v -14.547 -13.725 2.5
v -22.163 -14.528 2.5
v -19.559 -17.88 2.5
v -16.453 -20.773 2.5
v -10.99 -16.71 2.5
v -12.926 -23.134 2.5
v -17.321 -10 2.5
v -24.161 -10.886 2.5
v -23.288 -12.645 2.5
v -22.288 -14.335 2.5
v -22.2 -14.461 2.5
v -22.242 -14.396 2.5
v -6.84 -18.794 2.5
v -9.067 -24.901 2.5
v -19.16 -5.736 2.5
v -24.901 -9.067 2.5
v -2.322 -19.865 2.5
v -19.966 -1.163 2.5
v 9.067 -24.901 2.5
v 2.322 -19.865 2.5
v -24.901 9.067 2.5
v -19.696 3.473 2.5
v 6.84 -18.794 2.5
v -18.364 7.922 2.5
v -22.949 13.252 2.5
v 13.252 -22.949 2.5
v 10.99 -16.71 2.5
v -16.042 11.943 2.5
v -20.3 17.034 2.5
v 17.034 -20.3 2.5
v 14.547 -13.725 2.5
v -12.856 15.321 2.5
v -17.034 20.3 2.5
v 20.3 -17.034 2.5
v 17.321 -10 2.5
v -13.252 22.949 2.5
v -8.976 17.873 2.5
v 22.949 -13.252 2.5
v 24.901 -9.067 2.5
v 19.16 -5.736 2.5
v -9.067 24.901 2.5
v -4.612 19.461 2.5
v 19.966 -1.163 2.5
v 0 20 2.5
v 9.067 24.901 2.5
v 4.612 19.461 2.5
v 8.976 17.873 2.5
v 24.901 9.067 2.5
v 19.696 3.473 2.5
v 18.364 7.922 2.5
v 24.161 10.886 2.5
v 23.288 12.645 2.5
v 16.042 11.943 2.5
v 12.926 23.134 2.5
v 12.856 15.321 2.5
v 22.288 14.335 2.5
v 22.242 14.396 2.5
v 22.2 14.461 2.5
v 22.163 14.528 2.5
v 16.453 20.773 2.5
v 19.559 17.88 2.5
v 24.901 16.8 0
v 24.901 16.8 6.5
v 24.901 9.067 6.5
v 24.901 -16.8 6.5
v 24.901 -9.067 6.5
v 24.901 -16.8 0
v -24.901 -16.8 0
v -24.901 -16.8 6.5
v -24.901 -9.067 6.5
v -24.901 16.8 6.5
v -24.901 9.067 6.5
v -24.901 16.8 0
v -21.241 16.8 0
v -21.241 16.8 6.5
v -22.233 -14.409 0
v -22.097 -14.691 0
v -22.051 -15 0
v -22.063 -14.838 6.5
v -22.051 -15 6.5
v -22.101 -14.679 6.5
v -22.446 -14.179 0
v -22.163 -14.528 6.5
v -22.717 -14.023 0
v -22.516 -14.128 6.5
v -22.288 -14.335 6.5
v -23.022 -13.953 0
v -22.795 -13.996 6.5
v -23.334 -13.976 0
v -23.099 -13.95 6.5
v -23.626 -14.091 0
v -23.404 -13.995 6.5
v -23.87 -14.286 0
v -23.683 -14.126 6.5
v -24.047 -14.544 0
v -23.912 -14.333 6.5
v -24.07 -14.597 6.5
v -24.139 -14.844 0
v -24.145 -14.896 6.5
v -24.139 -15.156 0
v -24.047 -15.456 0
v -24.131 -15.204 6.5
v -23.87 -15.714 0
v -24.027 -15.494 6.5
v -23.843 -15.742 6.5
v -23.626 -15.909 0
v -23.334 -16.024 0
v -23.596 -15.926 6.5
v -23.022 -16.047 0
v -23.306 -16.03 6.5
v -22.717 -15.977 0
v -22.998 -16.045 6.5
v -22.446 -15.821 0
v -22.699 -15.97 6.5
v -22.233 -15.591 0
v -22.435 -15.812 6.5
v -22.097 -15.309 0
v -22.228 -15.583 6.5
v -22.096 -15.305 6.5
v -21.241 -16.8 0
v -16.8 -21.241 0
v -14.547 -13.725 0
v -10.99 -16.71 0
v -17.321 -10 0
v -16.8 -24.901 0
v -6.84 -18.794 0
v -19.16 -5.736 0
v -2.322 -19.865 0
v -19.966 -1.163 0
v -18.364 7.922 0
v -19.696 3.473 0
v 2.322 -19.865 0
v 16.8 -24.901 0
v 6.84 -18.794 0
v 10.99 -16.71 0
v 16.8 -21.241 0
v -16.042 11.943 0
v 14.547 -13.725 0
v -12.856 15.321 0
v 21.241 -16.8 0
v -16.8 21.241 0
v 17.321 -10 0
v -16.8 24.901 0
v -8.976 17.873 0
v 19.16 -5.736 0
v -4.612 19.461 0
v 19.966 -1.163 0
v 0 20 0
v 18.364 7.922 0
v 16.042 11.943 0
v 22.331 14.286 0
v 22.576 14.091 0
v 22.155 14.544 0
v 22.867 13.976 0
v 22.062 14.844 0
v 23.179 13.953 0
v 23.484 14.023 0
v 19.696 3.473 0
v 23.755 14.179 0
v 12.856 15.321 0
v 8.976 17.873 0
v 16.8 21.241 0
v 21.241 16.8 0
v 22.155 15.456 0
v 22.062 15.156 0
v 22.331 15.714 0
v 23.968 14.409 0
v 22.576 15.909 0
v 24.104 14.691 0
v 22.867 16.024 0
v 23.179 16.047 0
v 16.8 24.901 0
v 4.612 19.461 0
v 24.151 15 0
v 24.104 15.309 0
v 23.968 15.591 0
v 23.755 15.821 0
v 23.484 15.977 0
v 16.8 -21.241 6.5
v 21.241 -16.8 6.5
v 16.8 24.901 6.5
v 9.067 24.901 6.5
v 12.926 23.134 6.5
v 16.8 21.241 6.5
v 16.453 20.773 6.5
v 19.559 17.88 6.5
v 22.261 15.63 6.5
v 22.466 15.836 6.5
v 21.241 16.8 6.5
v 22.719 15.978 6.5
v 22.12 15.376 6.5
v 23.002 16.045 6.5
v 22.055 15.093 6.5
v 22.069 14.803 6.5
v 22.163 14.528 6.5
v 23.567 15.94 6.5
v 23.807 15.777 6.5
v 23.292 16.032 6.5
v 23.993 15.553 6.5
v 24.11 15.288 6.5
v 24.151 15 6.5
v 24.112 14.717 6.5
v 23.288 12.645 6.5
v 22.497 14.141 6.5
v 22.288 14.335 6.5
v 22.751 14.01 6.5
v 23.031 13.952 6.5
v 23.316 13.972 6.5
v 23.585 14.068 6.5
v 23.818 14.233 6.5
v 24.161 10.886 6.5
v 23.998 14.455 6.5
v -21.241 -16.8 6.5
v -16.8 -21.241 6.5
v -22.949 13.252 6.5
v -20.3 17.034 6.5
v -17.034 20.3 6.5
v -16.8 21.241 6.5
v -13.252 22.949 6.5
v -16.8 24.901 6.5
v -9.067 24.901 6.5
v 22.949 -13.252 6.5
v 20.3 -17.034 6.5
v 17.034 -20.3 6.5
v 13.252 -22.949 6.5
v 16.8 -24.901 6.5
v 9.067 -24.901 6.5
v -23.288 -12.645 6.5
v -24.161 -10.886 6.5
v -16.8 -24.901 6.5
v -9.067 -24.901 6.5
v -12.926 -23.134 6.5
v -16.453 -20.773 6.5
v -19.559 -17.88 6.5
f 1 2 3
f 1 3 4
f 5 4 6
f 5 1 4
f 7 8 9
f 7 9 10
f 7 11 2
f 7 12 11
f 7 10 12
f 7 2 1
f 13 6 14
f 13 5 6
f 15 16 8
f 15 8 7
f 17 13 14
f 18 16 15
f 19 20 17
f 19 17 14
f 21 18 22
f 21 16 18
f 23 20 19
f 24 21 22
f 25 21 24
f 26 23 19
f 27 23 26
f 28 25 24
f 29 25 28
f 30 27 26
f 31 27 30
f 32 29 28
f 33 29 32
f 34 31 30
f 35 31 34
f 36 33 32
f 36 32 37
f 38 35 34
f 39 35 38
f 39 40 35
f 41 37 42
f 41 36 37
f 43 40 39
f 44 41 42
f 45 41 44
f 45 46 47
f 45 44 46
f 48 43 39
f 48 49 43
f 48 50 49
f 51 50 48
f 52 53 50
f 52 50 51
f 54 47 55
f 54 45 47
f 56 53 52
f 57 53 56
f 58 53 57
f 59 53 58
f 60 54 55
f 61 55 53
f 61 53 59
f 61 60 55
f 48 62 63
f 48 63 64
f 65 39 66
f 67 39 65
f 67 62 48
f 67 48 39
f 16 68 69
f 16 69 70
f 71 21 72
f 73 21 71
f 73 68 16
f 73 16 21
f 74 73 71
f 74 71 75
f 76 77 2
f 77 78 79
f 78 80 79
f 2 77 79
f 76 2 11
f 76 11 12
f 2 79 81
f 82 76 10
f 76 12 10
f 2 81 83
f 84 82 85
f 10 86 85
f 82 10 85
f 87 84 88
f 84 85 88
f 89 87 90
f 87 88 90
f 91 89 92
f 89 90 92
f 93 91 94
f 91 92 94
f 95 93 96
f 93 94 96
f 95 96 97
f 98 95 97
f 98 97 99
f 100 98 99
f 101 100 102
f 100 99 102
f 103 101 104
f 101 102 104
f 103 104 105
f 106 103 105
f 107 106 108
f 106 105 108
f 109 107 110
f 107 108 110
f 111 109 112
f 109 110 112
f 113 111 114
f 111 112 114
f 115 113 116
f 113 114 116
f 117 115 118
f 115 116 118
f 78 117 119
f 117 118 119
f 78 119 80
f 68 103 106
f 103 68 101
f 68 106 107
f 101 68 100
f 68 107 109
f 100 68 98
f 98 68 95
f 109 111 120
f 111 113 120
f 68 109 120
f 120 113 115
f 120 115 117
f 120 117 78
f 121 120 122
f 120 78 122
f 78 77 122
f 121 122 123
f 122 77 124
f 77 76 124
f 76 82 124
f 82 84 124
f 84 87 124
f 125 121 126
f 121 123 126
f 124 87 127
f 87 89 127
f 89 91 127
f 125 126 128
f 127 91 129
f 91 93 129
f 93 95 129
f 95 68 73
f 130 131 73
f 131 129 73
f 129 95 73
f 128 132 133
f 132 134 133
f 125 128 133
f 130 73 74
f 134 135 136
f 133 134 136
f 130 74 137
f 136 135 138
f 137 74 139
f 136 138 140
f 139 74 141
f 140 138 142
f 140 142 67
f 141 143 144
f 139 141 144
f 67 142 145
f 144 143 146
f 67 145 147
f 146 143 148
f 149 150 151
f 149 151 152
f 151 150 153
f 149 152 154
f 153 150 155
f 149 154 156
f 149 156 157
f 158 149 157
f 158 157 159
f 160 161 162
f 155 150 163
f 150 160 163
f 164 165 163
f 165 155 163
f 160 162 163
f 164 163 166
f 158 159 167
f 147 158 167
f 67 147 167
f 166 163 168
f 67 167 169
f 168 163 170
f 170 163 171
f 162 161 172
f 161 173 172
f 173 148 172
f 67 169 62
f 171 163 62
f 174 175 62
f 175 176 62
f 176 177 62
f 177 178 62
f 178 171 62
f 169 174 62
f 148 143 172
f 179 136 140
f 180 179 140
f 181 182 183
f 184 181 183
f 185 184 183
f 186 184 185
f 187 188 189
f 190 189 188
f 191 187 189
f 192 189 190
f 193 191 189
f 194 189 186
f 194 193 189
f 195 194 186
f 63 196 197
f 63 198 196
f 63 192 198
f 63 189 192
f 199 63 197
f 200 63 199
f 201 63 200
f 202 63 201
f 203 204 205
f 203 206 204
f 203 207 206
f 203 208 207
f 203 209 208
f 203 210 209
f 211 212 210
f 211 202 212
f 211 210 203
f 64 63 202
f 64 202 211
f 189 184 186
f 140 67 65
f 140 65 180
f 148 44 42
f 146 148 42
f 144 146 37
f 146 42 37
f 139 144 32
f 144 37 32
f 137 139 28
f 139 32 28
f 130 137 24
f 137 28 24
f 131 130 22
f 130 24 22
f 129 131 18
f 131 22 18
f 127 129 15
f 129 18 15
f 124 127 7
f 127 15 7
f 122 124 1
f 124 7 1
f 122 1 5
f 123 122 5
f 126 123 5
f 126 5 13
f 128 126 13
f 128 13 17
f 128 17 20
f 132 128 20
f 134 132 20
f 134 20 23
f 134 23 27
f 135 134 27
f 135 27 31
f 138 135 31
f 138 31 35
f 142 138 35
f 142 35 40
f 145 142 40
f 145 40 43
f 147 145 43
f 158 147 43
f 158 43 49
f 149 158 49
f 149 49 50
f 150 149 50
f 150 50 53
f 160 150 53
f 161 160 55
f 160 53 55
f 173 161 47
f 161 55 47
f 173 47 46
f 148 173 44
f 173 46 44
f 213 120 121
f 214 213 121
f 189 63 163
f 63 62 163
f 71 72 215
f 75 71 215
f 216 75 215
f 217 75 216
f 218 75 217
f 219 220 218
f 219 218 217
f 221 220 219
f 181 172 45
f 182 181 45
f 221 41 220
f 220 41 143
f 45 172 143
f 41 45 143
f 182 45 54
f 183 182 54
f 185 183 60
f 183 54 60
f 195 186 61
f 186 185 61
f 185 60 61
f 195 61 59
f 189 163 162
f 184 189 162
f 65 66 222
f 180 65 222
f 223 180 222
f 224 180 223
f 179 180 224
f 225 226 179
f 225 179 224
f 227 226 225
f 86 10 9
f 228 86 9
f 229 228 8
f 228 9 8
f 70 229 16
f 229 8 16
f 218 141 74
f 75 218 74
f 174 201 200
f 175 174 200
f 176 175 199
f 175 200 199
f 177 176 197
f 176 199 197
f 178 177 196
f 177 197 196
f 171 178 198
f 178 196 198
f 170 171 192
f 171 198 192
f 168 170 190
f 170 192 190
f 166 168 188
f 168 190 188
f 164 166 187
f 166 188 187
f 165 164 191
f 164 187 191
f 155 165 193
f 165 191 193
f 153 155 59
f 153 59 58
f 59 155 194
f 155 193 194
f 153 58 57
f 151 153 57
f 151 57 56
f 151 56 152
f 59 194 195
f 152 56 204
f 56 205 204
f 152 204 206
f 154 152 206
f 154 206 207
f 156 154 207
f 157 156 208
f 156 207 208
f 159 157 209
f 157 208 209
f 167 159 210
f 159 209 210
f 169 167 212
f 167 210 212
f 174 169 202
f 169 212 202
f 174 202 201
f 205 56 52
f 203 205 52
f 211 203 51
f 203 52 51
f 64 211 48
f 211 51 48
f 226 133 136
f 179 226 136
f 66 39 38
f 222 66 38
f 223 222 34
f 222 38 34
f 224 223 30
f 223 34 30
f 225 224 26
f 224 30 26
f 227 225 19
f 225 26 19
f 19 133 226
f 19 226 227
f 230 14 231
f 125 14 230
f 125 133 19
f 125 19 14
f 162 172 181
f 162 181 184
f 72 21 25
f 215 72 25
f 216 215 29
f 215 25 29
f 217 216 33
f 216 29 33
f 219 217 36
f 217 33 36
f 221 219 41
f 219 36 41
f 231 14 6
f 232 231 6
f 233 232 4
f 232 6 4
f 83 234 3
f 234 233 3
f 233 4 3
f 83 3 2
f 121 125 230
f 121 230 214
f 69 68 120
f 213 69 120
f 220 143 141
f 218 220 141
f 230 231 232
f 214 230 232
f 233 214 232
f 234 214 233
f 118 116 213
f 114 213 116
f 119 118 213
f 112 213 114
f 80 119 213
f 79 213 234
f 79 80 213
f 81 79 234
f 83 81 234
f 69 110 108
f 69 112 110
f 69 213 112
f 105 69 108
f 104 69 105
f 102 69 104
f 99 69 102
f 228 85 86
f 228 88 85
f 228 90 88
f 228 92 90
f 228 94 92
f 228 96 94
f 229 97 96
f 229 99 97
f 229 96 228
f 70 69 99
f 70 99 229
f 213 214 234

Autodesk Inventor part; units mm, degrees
ref_plane "YZ Plane" through (0, 0, 0) normal (1, 0, 0) x (0, 1, 0)
ref_plane "XZ Plane" through (0, 0, 0) normal (0, 1, 0) x (-1, 0, 0)
ref_plane "XY Plane" through (0, 0, 0) normal (0, 0, 1) x (1, 0, 0)
sketch "Sketch1" plane through (0, 0, 0) normal (0, 0, 1) x (1, 0, 0)
  line L0 (-34.8609, 0) -> (34.8609, 0) construction
  line L1 (0, -34.8609) -> (0, 34.8609) construction
  line L2 (0, 0) -> (11.6542, 11.6542) construction
  line L3 (0, 0) -> (16.4815, 0) construction
  line L4 (0, 24.9006) -> (16.8, 24.9006)
  line L5 (16.8, 24.9006) -> (16.8, 21.2406)
  line L6 (16.8, 21.2406) -> (19.0203, 19.0203)
  line L7 (24.9006, 0) -> (24.9006, 16.8)
  line L8 (24.9006, 16.8) -> (21.2406, 16.8)
  line L9 (21.2406, 16.8) -> (19.0203, 19.0203)
  line L10 (0, 0) -> (-11.6542, 11.6542) construction
  line L11 (0, 0) -> (-16.4815, 0) construction
  line L12 (0, 24.9006) -> (-16.8, 24.9006)
  line L13 (-16.8, 24.9006) -> (-16.8, 21.2406)
  line L14 (-16.8, 21.2406) -> (-19.0203, 19.0203)
  line L15 (-24.9006, 0) -> (-24.9006, 16.8)
  line L16 (-24.9006, 16.8) -> (-21.2406, 16.8)
  line L17 (-21.2406, 16.8) -> (-19.0203, 19.0203)
  line L18 (0, 0) -> (11.6542, -11.6542) construction
  line L19 (0, -24.9006) -> (16.8, -24.9006)
  line L20 (16.8, -24.9006) -> (16.8, -21.2406)
  line L21 (16.8, -21.2406) -> (19.0203, -19.0203)
  line L22 (24.9006, 0) -> (24.9006, -16.8)
  line L23 (24.9006, -16.8) -> (21.2406, -16.8)
  line L24 (21.2406, -16.8) -> (19.0203, -19.0203)
  line L25 (0, 0) -> (-11.6542, -11.6542) construction
  line L26 (0, -24.9006) -> (-16.8, -24.9006)
  line L27 (-16.8, -24.9006) -> (-16.8, -21.2406)
  line L28 (-16.8, -21.2406) -> (-19.0203, -19.0203)
  line L29 (-24.9006, 0) -> (-24.9006, -16.8)
  line L30 (-24.9006, -16.8) -> (-21.2406, -16.8)
  line L31 (-21.2406, -16.8) -> (-19.0203, -19.0203)
  dimension "d0" = 45
  dimension "d1" = 3.14
  dimension "d2" = 3.66
  dimension "d3" = 16.8
extrude "Extrusion1" add sketch "Sketch1" along normal blind 2.5
hole "Hole1" at (0, 0, 0) direction (0, 0, 1) diameter 40 end through all
sketch "Sketch5" plane through (0, 0, 2.5) normal (0, 0, 1) x (1, 0, 0)
  circle A0 centre (-22.1796, -5.0624) radius 1.25 construction
  circle A1 centre (-17.7867, 14.1844) radius 1.25 construction
  circle A2 centre (0, 22.75) radius 1.25 construction
  arc A3 (5.9445, 23.5204) -> (2.0147, 24.1761) centre (3.9503, 23.6727) ccw construction
  line L0 (2.0147, 24.1761) -> (2, 24) construction
  arc A4 (2, 24) -> (1.9973, 24.1039) centre (0, 24) ccw construction
  arc A5 (1.9973, 24.1039) -> (1.9775, 24.0019) centre (3.9503, 23.6727) ccw construction
  line L1 (1.9775, 24.0019) -> (1.9921, 24.178) construction
  arc A6 (1.9921, 24.178) -> (-1.9921, 24.178) centre (0, 24) ccw construction
  line L2 (-1.9921, 24.178) -> (-1.9775, 24.0019) construction
  arc A7 (-1.9775, 24.0019) -> (-1.9973, 24.1039) centre (-3.9503, 23.6727) ccw construction
  arc A8 (-1.9973, 24.1039) -> (-2, 24) centre (0, 24) ccw construction
  line L3 (-2, 24) -> (-2.0147, 24.1761) construction
  arc A9 (-2.0147, 24.1761) -> (-5.9445, 23.5204) centre (-3.9503, 23.6727) ccw construction
  line L4 (-5.9445, 23.5204) -> (-5.9012, 23.349) construction
  arc A10 (-5.9012, 23.349) -> (-5.9374, 23.4464) centre (-7.7928, 22.6996) ccw construction
  arc A11 (-5.9374, 23.4464) -> (-5.923, 23.3435) centre (-3.9503, 23.6727) ccw construction
  line L5 (-5.923, 23.3435) -> (-5.9665, 23.5148) construction
  arc A12 (-5.9665, 23.5148) -> (-9.7347, 22.2212) centre (-7.7928, 22.6996) ccw construction
  line L6 (-9.7347, 22.2212) -> (-9.6638, 22.0593) construction
  arc A13 (-9.6638, 22.0593) -> (-9.7156, 22.1493) centre (-11.4227, 21.1074) ccw construction
  arc A14 (-9.7156, 22.1493) -> (-9.6844, 22.0502) centre (-7.7928, 22.6996) ccw construction
  line L7 (-9.6844, 22.0502) -> (-9.7555, 22.212) construction
  arc A15 (-9.7555, 22.212) -> (-13.2594, 20.3158) centre (-11.4227, 21.1074) ccw construction
  line L8 (-13.2594, 20.3158) -> (-13.1628, 20.1678) construction
  arc A16 (-13.1628, 20.1678) -> (-13.2287, 20.2481) centre (-14.7411, 18.9394) ccw construction
  arc A17 (-13.2287, 20.2481) -> (-13.1817, 20.1555) centre (-11.4227, 21.1074) ccw construction
  line L9 (-13.1817, 20.1555) -> (-13.2784, 20.3034) construction
  arc A18 (-13.2784, 20.3034) -> (-16.4225, 17.8563) centre (-14.7411, 18.9394) ccw construction
  line L10 (-16.4225, 17.8563) -> (-16.3028, 17.7262) construction
  arc A19 (-16.3028, 17.7262) -> (-16.381, 17.7946) centre (-17.6574, 16.2548) ccw construction
  arc A20 (-16.381, 17.7946) -> (-16.3194, 17.7109) centre (-14.7411, 18.9394) ccw construction
  line L11 (-16.3194, 17.7109) -> (-16.4392, 17.8409) construction
  arc A21 (-16.4392, 17.8409) -> (-19.1375, 14.9097) centre (-17.6574, 16.2548) ccw construction
  line L12 (-19.1375, 14.9097) -> (-18.9981, 14.8011) construction
  arc A22 (-18.9981, 14.8011) -> (-19.0865, 14.8556) centre (-20.092, 13.1268) ccw construction
  arc A23 (-19.0865, 14.8556) -> (-19.0119, 14.7833) centre (-17.6574, 16.2548) ccw construction
  line L13 (-19.0119, 14.7833) -> (-19.1515, 14.8918) construction
  arc A24 (-19.1515, 14.8918) -> (-21.3306, 11.5564) centre (-20.092, 13.1268) ccw construction
  line L14 (-21.3306, 11.5564) -> (-21.1752, 11.4722) construction
  arc A25 (-21.1752, 11.4722) -> (-21.2714, 11.5115) centre (-21.9786, 9.6407) ccw construction
  arc A26 (-21.2714, 11.5115) -> (-21.1859, 11.4524) centre (-20.092, 13.1268) ccw construction
  line L15 (-21.1859, 11.4524) -> (-21.3414, 11.5365) construction
  arc A27 (-21.3414, 11.5365) -> (-22.9418, 7.8879) centre (-21.9786, 9.6407) ccw construction
  line L16 (-22.9418, 7.8879) -> (-22.7746, 7.8305) construction
  arc A28 (-22.7746, 7.8305) -> (-22.876, 7.8533) centre (-23.2656, 5.8917) ccw construction
  arc A29 (-22.876, 7.8533) -> (-22.782, 7.8091) centre (-21.9786, 9.6407) ccw construction
  line L17 (-22.782, 7.8091) -> (-22.9492, 7.8665) construction
  arc A30 (-22.9492, 7.8665) -> (-23.9272, 4.0042) centre (-23.2656, 5.8917) ccw construction
  line L18 (-23.9272, 4.0042) -> (-23.7529, 3.9751) construction
  arc A31 (-23.7529, 3.9751) -> (-23.8566, 3.981) centre (-23.918, 1.9819) ccw construction
  arc A32 (-23.8566, 3.981) -> (-23.7566, 3.9529) centre (-23.2656, 5.8917) ccw construction
  line L19 (-23.7566, 3.9529) -> (-23.9309, 3.9819) construction
  arc A33 (-23.9309, 3.9819) -> (-24.2599, 0.0113) centre (-23.918, 1.9819) ccw construction
  line L20 (-24.2599, 0.0113) -> (-24.0832, 0.0113) construction
  arc A34 (-24.0832, 0.0113) -> (-24.1865, 0) centre (-23.918, -1.9819) ccw construction
  arc A35 (-24.1865, 0) -> (-24.0832, -0.0113) centre (-23.918, 1.9819) ccw construction
  line L21 (-24.0832, -0.0113) -> (-24.2599, -0.0113) construction
  arc A36 (-24.2599, -0.0113) -> (-23.9309, -3.9819) centre (-23.918, -1.9819) ccw construction
  line L22 (-23.9309, -3.9819) -> (-23.7566, -3.9529) construction
  arc A37 (-23.7566, -3.9529) -> (-23.8566, -3.981) centre (-23.2656, -5.8917) ccw construction
  arc A38 (-23.8566, -3.981) -> (-23.7529, -3.9751) centre (-23.918, -1.9819) ccw construction
  line L23 (-23.7529, -3.9751) -> (-23.9272, -4.0042) construction
  arc A39 (-23.9272, -4.0042) -> (-22.9492, -7.8665) centre (-23.2656, -5.8917) ccw construction
  line L24 (-22.9492, -7.8665) -> (-22.782, -7.8091) construction
  arc A40 (-22.782, -7.8091) -> (-22.876, -7.8533) centre (-21.9786, -9.6407) ccw construction
  arc A41 (-22.876, -7.8533) -> (-22.7746, -7.8305) centre (-23.2656, -5.8917) ccw construction
  line L25 (-22.7746, -7.8305) -> (-22.9418, -7.8879) construction
  arc A42 (-22.9418, -7.8879) -> (-21.3414, -11.5365) centre (-21.9786, -9.6407) ccw construction
  line L26 (-21.3414, -11.5365) -> (-21.1859, -11.4524) construction
  arc A43 (-21.1859, -11.4524) -> (-21.2714, -11.5115) centre (-20.092, -13.1268) ccw construction
  arc A44 (-21.2714, -11.5115) -> (-21.1752, -11.4722) centre (-21.9786, -9.6407) ccw construction
  line L27 (-21.1752, -11.4722) -> (-21.3306, -11.5564) construction
  arc A45 (-21.3306, -11.5564) -> (-19.1515, -14.8918) centre (-20.092, -13.1268) ccw construction
  line L28 (-19.1515, -14.8918) -> (-19.0119, -14.7833) construction
  arc A46 (-19.0119, -14.7833) -> (-19.0865, -14.8556) centre (-17.6574, -16.2548) ccw construction
  arc A47 (-19.0865, -14.8556) -> (-18.9981, -14.8011) centre (-20.092, -13.1268) ccw construction
  line L29 (-18.9981, -14.8011) -> (-19.1375, -14.9097) construction
  arc A48 (-19.1375, -14.9097) -> (-16.4392, -17.8409) centre (-17.6574, -16.2548) ccw construction
  line L30 (-16.4392, -17.8409) -> (-16.3194, -17.7109) construction
  arc A49 (-16.3194, -17.7109) -> (-16.381, -17.7946) centre (-14.7411, -18.9394) ccw construction
  arc A50 (-16.381, -17.7946) -> (-16.3028, -17.7262) centre (-17.6574, -16.2548) ccw construction
  line L31 (-16.3028, -17.7262) -> (-16.4225, -17.8563) construction
  arc A51 (-16.4225, -17.8563) -> (-13.2784, -20.3034) centre (-14.7411, -18.9394) ccw construction
  line L32 (-13.2784, -20.3034) -> (-13.1817, -20.1555) construction
  arc A52 (-13.1817, -20.1555) -> (-13.2287, -20.2481) centre (-11.4227, -21.1074) ccw construction
  arc A53 (-13.2287, -20.2481) -> (-13.1628, -20.1678) centre (-14.7411, -18.9394) ccw construction
  line L33 (-13.1628, -20.1678) -> (-13.2594, -20.3158) construction
  arc A54 (-13.2594, -20.3158) -> (-9.7555, -22.212) centre (-11.4227, -21.1074) ccw construction
  line L34 (-9.7555, -22.212) -> (-9.6844, -22.0502) construction
  arc A55 (-9.6844, -22.0502) -> (-9.7156, -22.1493) centre (-7.7928, -22.6996) ccw construction
  arc A56 (-9.7156, -22.1493) -> (-9.6638, -22.0593) centre (-11.4227, -21.1074) ccw construction
  line L35 (-9.6638, -22.0593) -> (-9.7347, -22.2212) construction
  arc A57 (-9.7347, -22.2212) -> (-5.9665, -23.5148) centre (-7.7928, -22.6996) ccw construction
  line L36 (-5.9665, -23.5148) -> (-5.923, -23.3435) construction
  arc A58 (-5.923, -23.3435) -> (-5.9374, -23.4464) centre (-3.9503, -23.6727) ccw construction
  arc A59 (-5.9374, -23.4464) -> (-5.9012, -23.349) centre (-7.7928, -22.6996) ccw construction
  line L37 (-5.9012, -23.349) -> (-5.9445, -23.5204) construction
  arc A60 (-5.9445, -23.5204) -> (-2.0147, -24.1761) centre (-3.9503, -23.6727) ccw construction
  line L38 (-2.0147, -24.1761) -> (-2, -24) construction
  arc A61 (-2, -24) -> (-1.9973, -24.1039) centre (0, -24) ccw construction
  arc A62 (-1.9973, -24.1039) -> (-1.9775, -24.0019) centre (-3.9503, -23.6727) ccw construction
  line L39 (-1.9775, -24.0019) -> (-1.9921, -24.178) construction
  arc A63 (-1.9921, -24.178) -> (1.9921, -24.178) centre (0, -24) ccw construction
  line L40 (1.9921, -24.178) -> (1.9775, -24.0019) construction
  arc A64 (1.9775, -24.0019) -> (1.9973, -24.1039) centre (3.9503, -23.6727) ccw construction
  arc A65 (1.9973, -24.1039) -> (2, -24) centre (0, -24) ccw construction
  line L41 (2, -24) -> (2.0147, -24.1761) construction
  arc A66 (2.0147, -24.1761) -> (5.9445, -23.5204) centre (3.9503, -23.6727) ccw construction
  line L42 (5.9445, -23.5204) -> (5.9012, -23.349) construction
  arc A67 (5.9012, -23.349) -> (5.9374, -23.4464) centre (7.7928, -22.6996) ccw construction
  arc A68 (5.9374, -23.4464) -> (5.923, -23.3435) centre (3.9503, -23.6727) ccw construction
  line L43 (5.923, -23.3435) -> (5.9665, -23.5148) construction
  arc A69 (5.9665, -23.5148) -> (9.7347, -22.2212) centre (7.7928, -22.6996) ccw construction
  line L44 (9.7347, -22.2212) -> (9.6638, -22.0593) construction
  arc A70 (9.6638, -22.0593) -> (9.7156, -22.1493) centre (11.4227, -21.1074) ccw construction
  arc A71 (9.7156, -22.1493) -> (9.6844, -22.0502) centre (7.7928, -22.6996) ccw construction
  line L45 (9.6844, -22.0502) -> (9.7555, -22.212) construction
  arc A72 (9.7555, -22.212) -> (13.2594, -20.3158) centre (11.4227, -21.1074) ccw construction
  line L46 (13.2594, -20.3158) -> (13.1628, -20.1678) construction
  arc A73 (13.1628, -20.1678) -> (13.2287, -20.2481) centre (14.7411, -18.9394) ccw construction
  arc A74 (13.2287, -20.2481) -> (13.1817, -20.1555) centre (11.4227, -21.1074) ccw construction
  line L47 (13.1817, -20.1555) -> (13.2784, -20.3034) construction
  arc A75 (13.2784, -20.3034) -> (16.4225, -17.8563) centre (14.7411, -18.9394) ccw construction
  line L48 (16.4225, -17.8563) -> (16.3028, -17.7262) construction
  arc A76 (16.3028, -17.7262) -> (16.381, -17.7946) centre (17.6574, -16.2548) ccw construction
  arc A77 (16.381, -17.7946) -> (16.3194, -17.7109) centre (14.7411, -18.9394) ccw construction
  line L49 (16.3194, -17.7109) -> (16.4392, -17.8409) construction
  arc A78 (16.4392, -17.8409) -> (19.1375, -14.9097) centre (17.6574, -16.2548) ccw construction
  line L50 (19.1375, -14.9097) -> (18.9981, -14.8011) construction
  arc A79 (18.9981, -14.8011) -> (19.0865, -14.8556) centre (20.092, -13.1268) ccw construction
  arc A80 (19.0865, -14.8556) -> (19.0119, -14.7833) centre (17.6574, -16.2548) ccw construction
  line L51 (19.0119, -14.7833) -> (19.1515, -14.8918) construction
  arc A81 (19.1515, -14.8918) -> (21.3306, -11.5564) centre (20.092, -13.1268) ccw construction
  line L52 (21.3306, -11.5564) -> (21.1752, -11.4722) construction
  arc A82 (21.1752, -11.4722) -> (21.2714, -11.5115) centre (21.9786, -9.6407) ccw construction
  arc A83 (21.2714, -11.5115) -> (21.1859, -11.4524) centre (20.092, -13.1268) ccw construction
  line L53 (21.1859, -11.4524) -> (21.3414, -11.5365) construction
  arc A84 (21.3414, -11.5365) -> (22.9418, -7.8879) centre (21.9786, -9.6407) ccw construction
  line L54 (22.9418, -7.8879) -> (22.7746, -7.8305) construction
  arc A85 (22.7746, -7.8305) -> (22.876, -7.8533) centre (23.2656, -5.8917) ccw construction
  arc A86 (22.876, -7.8533) -> (22.782, -7.8091) centre (21.9786, -9.6407) ccw construction
  line L55 (22.782, -7.8091) -> (22.9492, -7.8665) construction
  arc A87 (22.9492, -7.8665) -> (23.9272, -4.0042) centre (23.2656, -5.8917) ccw construction
  line L56 (23.9272, -4.0042) -> (23.7529, -3.9751) construction
  arc A88 (23.7529, -3.9751) -> (23.8566, -3.981) centre (23.918, -1.9819) ccw construction
  arc A89 (23.8566, -3.981) -> (23.7566, -3.9529) centre (23.2656, -5.8917) ccw construction
  line L57 (23.7566, -3.9529) -> (23.9309, -3.9819) construction
  arc A90 (23.9309, -3.9819) -> (24.2599, -0.0113) centre (23.918, -1.9819) ccw construction
  line L58 (24.2599, -0.0113) -> (24.0832, -0.0113) construction
  arc A91 (24.0832, -0.0113) -> (24.1865, 0) centre (23.918, 1.9819) ccw construction
  arc A92 (24.1865, 0) -> (24.0832, 0.0113) centre (23.918, -1.9819) ccw construction
  line L59 (24.0832, 0.0113) -> (24.2599, 0.0113) construction
  arc A93 (24.2599, 0.0113) -> (23.9309, 3.9819) centre (23.918, 1.9819) ccw construction
  line L60 (23.9309, 3.9819) -> (23.7566, 3.9529) construction
  arc A94 (23.7566, 3.9529) -> (23.8566, 3.981) centre (23.2656, 5.8917) ccw construction
  arc A95 (23.8566, 3.981) -> (23.7529, 3.9751) centre (23.918, 1.9819) ccw construction
  line L61 (23.7529, 3.9751) -> (23.9272, 4.0042) construction
  arc A96 (23.9272, 4.0042) -> (22.9492, 7.8665) centre (23.2656, 5.8917) ccw construction
  line L62 (22.9492, 7.8665) -> (22.782, 7.8091) construction
  arc A97 (22.782, 7.8091) -> (22.876, 7.8533) centre (21.9786, 9.6407) ccw construction
  arc A98 (22.876, 7.8533) -> (22.7746, 7.8305) centre (23.2656, 5.8917) ccw construction
  line L63 (22.7746, 7.8305) -> (22.9418, 7.8879) construction
  arc A99 (22.9418, 7.8879) -> (21.3414, 11.5365) centre (21.9786, 9.6407) ccw construction
  line L64 (21.3414, 11.5365) -> (21.1859, 11.4524) construction
  arc A100 (21.1859, 11.4524) -> (21.2714, 11.5115) centre (20.092, 13.1268) ccw construction
  arc A101 (21.2714, 11.5115) -> (21.1752, 11.4722) centre (21.9786, 9.6407) ccw construction
  line L65 (21.1752, 11.4722) -> (21.3306, 11.5564) construction
  arc A102 (21.3306, 11.5564) -> (19.1515, 14.8918) centre (20.092, 13.1268) ccw construction
  line L66 (19.1515, 14.8918) -> (19.0119, 14.7833) construction
  arc A103 (19.0119, 14.7833) -> (19.0865, 14.8556) centre (17.6574, 16.2548) ccw construction
  arc A104 (19.0865, 14.8556) -> (18.9981, 14.8011) centre (20.092, 13.1268) ccw construction
  line L67 (18.9981, 14.8011) -> (19.1375, 14.9097) construction
  arc A105 (19.1375, 14.9097) -> (16.4392, 17.8409) centre (17.6574, 16.2548) ccw construction
  line L68 (16.4392, 17.8409) -> (16.3194, 17.7109) construction
  arc A106 (16.3194, 17.7109) -> (16.381, 17.7946) centre (14.7411, 18.9394) ccw construction
  arc A107 (16.381, 17.7946) -> (16.3028, 17.7262) centre (17.6574, 16.2548) ccw construction
  line L69 (16.3028, 17.7262) -> (16.4225, 17.8563) construction
  arc A108 (16.4225, 17.8563) -> (13.2784, 20.3034) centre (14.7411, 18.9394) ccw construction
  line L70 (13.2784, 20.3034) -> (13.1817, 20.1555) construction
  arc A109 (13.1817, 20.1555) -> (13.2287, 20.2481) centre (11.4227, 21.1074) ccw construction
  arc A110 (13.2287, 20.2481) -> (13.1628, 20.1678) centre (14.7411, 18.9394) ccw construction
  line L71 (13.1628, 20.1678) -> (13.2594, 20.3158) construction
  arc A111 (13.2594, 20.3158) -> (9.7555, 22.212) centre (11.4227, 21.1074) ccw construction
  line L72 (9.7555, 22.212) -> (9.6844, 22.0502) construction
  arc A112 (9.6844, 22.0502) -> (9.7156, 22.1493) centre (7.7928, 22.6996) ccw construction
  arc A113 (9.7156, 22.1493) -> (9.6638, 22.0593) centre (11.4227, 21.1074) ccw construction
  line L73 (9.6638, 22.0593) -> (9.7347, 22.2212) construction
  arc A114 (9.7347, 22.2212) -> (5.9665, 23.5148) centre (7.7928, 22.6996) ccw construction
  line L74 (5.9665, 23.5148) -> (5.923, 23.3435) construction
  arc A115 (5.923, 23.3435) -> (5.9374, 23.4464) centre (3.9503, 23.6727) ccw construction
  arc A116 (5.9374, 23.4464) -> (5.9012, 23.349) centre (7.7928, 22.6996) ccw construction
  line L75 (5.9012, 23.349) -> (5.9445, 23.5204) construction
  circle A117 centre (0, 0) radius 21 construction
  circle A118 centre (0, 0) radius 20 construction
  line L76 (16.8, 24.9006) -> (-16.8, 24.9006) construction
  line L77 (-16.8, 24.9006) -> (-16.8, 21.2406) construction
  line L78 (-16.8, 21.2406) -> (-21.2406, 16.8) construction
  line L79 (-21.2406, 16.8) -> (-24.9006, 16.8) construction
  line L80 (-24.9006, 16.8) -> (-24.9006, -16.8) construction
  line L81 (-24.9006, -16.8) -> (-21.2406, -16.8) construction
  line L82 (-21.2406, -16.8) -> (-16.8, -21.2406) construction
  line L83 (-16.8, -21.2406) -> (-16.8, -24.9006) construction
  line L84 (-16.8, -24.9006) -> (16.8, -24.9006) construction
  line L85 (16.8, -24.9006) -> (16.8, -21.2406) construction
  line L86 (16.8, -21.2406) -> (21.2406, -16.8) construction
  line L87 (21.2406, -16.8) -> (24.9006, -16.8) construction
  line L88 (24.9006, -16.8) -> (24.9006, 16.8) construction
  line L89 (24.9006, 16.8) -> (21.2406, 16.8) construction
  line L90 (21.2406, 16.8) -> (16.8, 21.2406) construction
  line L91 (16.8, 21.2406) -> (16.8, 24.9006) construction
  circle A119 centre (0, 0) radius 26 construction
  line L92 (-16.8, 24.9006) -> (16.8, 24.9006) projected
  line L93 (-9.0669, 24.9006) -> (-16.8, 24.9006)
  line L94 (-16.8, 24.9006) -> (-16.8, 21.2406)
  line L95 (-16.8, 21.2406) -> (-21.2406, 16.8)
  line L96 (-24.9006, 16.8) -> (-21.2406, 16.8) projected
  line L97 (-21.2406, 16.8) -> (-24.9006, 16.8)
  line L98 (-24.9006, 16.8) -> (-24.9006, 9.0669)
  line L99 (-24.9006, 16.8) -> (-24.9006, -16.8) projected
  arc A120 (-9.0669, 24.9006) -> (-24.9006, 9.0669) centre (0, 0) ccw
  circle A121 centre (17.7867, 14.1844) radius 1.25 projected
  circle A122 centre (22.1796, -5.0624) radius 1.25 projected
  circle A123 centre (9.8709, -20.497) radius 1.25 projected
  circle A124 centre (-9.8709, -20.497) radius 1.25 projected
  dimension "d20" = 0.5
extrude "Extrusion3" add sketch "Sketch5" along normal blind 4 contours L92 A120 L98 L96 L95 L94
pattern_circular "Circular Pattern1" count 4 over 360 about axis through (0, 0, -10) along (0, 0, 1) of "Extrusion3"
sketch "Sketch6" plane through (9.0669, 24.9006, 6.5) normal (0, 0, 1) x (1, 0, 0)
  line L0 (15.8337, -8.1006) -> (12.1737, -8.1006) construction
  line L1 (12.1737, -8.1006) -> (7.7331, -3.66) construction
  line L2 (7.7331, -3.66) -> (7.7331, 0) construction
  line L3 (7.7331, 0) -> (0, 0) construction
  arc A0 (15.8337, -15.8337) -> (0, 0) centre (-9.0669, -24.9006) ccw construction
  line L4 (15.8337, -15.8337) -> (15.8337, -8.1006) construction
  line L5 (-33.9675, -41.7006) -> (-30.3075, -41.7006) construction
  line L6 (-30.3075, -41.7006) -> (-25.8669, -46.1413) construction
  line L7 (-25.8669, -46.1413) -> (-25.8669, -49.8013) construction
  line L8 (-25.8669, -49.8013) -> (-18.1338, -49.8013) construction
  arc A1 (-33.9675, -33.9675) -> (-18.1338, -49.8013) centre (-9.0669, -24.9006) ccw construction
  line L9 (-33.9675, -33.9675) -> (-33.9675, -41.7006) construction
  circle A2 centre (-32.1675, -39.9006) radius 1.05
  circle A3 centre (14.0337, -9.9006) radius 1.05
  line L10 (-33.9675, -41.7006) -> (-32.1675, -41.7006) construction
  line L11 (-32.1675, -41.7006) -> (-32.1675, -39.9006) construction
  line L12 (-32.1675, -39.9006) -> (-33.9675, -39.9006) construction
  line L13 (-33.9675, -39.9006) -> (-33.9675, -41.7006) construction
  line L14 (7.7331, 0) -> (6.2331, 0) construction
  line L15 (7.7331, -1.5) -> (7.7331, 0) construction
  line L16 (12.1737, -8.1006) -> (15.8337, -8.1006) projected
  line L17 (14.0337, -8.1006) -> (14.0337, -9.9006) construction
  line L18 (14.0337, -9.9006) -> (15.8337, -9.9006) construction
  line L19 (15.8337, -8.1006) -> (15.8337, -41.7006) projected
  dimension "d26" = 2.1
  dimension "d27" = 2.1
  dimension "d28" = 1.8
  dimension "d29" = 1.8
  dimension "d34" = 1.8
  dimension "d35" = 1.8
extrude "Extrusion4" cut sketch "Sketch6" against normal through all
properties part number "20_Cube_Insert_CirAp_Lid"
